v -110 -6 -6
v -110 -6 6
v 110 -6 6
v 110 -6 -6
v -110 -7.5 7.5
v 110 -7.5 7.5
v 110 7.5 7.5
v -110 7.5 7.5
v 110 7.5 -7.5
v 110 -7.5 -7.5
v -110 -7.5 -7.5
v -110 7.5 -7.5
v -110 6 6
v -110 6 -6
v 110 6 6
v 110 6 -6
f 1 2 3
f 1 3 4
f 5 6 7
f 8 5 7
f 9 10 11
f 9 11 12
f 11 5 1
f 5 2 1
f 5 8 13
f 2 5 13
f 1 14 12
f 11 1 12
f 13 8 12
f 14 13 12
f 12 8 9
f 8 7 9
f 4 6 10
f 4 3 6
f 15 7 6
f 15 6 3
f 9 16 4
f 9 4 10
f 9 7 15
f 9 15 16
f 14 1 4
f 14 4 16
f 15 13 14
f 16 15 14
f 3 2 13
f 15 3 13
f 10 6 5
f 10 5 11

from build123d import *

# Parameters (mm, degrees)
SKETCH1_W           = 15
SKETCH1_H           = 15
SKETCH1_W_2         = 12
SKETCH1_H_2         = 12
BOSS_EXTRUDE1_DEPTH = 110


with BuildPart() as part:
    # Sketch1 → Boss-Extrude1 (new body, symmetric)
    with BuildSketch(Plane(origin=(0, 0, 0), x_dir=(0, 0, -1), z_dir=(1, 0, 0))):
        Rectangle(SKETCH1_W, SKETCH1_H)
        Rectangle(SKETCH1_W_2, SKETCH1_H_2, mode=Mode.SUBTRACT)
    extrude(amount=BOSS_EXTRUDE1_DEPTH, both=True)


solid = part.part
